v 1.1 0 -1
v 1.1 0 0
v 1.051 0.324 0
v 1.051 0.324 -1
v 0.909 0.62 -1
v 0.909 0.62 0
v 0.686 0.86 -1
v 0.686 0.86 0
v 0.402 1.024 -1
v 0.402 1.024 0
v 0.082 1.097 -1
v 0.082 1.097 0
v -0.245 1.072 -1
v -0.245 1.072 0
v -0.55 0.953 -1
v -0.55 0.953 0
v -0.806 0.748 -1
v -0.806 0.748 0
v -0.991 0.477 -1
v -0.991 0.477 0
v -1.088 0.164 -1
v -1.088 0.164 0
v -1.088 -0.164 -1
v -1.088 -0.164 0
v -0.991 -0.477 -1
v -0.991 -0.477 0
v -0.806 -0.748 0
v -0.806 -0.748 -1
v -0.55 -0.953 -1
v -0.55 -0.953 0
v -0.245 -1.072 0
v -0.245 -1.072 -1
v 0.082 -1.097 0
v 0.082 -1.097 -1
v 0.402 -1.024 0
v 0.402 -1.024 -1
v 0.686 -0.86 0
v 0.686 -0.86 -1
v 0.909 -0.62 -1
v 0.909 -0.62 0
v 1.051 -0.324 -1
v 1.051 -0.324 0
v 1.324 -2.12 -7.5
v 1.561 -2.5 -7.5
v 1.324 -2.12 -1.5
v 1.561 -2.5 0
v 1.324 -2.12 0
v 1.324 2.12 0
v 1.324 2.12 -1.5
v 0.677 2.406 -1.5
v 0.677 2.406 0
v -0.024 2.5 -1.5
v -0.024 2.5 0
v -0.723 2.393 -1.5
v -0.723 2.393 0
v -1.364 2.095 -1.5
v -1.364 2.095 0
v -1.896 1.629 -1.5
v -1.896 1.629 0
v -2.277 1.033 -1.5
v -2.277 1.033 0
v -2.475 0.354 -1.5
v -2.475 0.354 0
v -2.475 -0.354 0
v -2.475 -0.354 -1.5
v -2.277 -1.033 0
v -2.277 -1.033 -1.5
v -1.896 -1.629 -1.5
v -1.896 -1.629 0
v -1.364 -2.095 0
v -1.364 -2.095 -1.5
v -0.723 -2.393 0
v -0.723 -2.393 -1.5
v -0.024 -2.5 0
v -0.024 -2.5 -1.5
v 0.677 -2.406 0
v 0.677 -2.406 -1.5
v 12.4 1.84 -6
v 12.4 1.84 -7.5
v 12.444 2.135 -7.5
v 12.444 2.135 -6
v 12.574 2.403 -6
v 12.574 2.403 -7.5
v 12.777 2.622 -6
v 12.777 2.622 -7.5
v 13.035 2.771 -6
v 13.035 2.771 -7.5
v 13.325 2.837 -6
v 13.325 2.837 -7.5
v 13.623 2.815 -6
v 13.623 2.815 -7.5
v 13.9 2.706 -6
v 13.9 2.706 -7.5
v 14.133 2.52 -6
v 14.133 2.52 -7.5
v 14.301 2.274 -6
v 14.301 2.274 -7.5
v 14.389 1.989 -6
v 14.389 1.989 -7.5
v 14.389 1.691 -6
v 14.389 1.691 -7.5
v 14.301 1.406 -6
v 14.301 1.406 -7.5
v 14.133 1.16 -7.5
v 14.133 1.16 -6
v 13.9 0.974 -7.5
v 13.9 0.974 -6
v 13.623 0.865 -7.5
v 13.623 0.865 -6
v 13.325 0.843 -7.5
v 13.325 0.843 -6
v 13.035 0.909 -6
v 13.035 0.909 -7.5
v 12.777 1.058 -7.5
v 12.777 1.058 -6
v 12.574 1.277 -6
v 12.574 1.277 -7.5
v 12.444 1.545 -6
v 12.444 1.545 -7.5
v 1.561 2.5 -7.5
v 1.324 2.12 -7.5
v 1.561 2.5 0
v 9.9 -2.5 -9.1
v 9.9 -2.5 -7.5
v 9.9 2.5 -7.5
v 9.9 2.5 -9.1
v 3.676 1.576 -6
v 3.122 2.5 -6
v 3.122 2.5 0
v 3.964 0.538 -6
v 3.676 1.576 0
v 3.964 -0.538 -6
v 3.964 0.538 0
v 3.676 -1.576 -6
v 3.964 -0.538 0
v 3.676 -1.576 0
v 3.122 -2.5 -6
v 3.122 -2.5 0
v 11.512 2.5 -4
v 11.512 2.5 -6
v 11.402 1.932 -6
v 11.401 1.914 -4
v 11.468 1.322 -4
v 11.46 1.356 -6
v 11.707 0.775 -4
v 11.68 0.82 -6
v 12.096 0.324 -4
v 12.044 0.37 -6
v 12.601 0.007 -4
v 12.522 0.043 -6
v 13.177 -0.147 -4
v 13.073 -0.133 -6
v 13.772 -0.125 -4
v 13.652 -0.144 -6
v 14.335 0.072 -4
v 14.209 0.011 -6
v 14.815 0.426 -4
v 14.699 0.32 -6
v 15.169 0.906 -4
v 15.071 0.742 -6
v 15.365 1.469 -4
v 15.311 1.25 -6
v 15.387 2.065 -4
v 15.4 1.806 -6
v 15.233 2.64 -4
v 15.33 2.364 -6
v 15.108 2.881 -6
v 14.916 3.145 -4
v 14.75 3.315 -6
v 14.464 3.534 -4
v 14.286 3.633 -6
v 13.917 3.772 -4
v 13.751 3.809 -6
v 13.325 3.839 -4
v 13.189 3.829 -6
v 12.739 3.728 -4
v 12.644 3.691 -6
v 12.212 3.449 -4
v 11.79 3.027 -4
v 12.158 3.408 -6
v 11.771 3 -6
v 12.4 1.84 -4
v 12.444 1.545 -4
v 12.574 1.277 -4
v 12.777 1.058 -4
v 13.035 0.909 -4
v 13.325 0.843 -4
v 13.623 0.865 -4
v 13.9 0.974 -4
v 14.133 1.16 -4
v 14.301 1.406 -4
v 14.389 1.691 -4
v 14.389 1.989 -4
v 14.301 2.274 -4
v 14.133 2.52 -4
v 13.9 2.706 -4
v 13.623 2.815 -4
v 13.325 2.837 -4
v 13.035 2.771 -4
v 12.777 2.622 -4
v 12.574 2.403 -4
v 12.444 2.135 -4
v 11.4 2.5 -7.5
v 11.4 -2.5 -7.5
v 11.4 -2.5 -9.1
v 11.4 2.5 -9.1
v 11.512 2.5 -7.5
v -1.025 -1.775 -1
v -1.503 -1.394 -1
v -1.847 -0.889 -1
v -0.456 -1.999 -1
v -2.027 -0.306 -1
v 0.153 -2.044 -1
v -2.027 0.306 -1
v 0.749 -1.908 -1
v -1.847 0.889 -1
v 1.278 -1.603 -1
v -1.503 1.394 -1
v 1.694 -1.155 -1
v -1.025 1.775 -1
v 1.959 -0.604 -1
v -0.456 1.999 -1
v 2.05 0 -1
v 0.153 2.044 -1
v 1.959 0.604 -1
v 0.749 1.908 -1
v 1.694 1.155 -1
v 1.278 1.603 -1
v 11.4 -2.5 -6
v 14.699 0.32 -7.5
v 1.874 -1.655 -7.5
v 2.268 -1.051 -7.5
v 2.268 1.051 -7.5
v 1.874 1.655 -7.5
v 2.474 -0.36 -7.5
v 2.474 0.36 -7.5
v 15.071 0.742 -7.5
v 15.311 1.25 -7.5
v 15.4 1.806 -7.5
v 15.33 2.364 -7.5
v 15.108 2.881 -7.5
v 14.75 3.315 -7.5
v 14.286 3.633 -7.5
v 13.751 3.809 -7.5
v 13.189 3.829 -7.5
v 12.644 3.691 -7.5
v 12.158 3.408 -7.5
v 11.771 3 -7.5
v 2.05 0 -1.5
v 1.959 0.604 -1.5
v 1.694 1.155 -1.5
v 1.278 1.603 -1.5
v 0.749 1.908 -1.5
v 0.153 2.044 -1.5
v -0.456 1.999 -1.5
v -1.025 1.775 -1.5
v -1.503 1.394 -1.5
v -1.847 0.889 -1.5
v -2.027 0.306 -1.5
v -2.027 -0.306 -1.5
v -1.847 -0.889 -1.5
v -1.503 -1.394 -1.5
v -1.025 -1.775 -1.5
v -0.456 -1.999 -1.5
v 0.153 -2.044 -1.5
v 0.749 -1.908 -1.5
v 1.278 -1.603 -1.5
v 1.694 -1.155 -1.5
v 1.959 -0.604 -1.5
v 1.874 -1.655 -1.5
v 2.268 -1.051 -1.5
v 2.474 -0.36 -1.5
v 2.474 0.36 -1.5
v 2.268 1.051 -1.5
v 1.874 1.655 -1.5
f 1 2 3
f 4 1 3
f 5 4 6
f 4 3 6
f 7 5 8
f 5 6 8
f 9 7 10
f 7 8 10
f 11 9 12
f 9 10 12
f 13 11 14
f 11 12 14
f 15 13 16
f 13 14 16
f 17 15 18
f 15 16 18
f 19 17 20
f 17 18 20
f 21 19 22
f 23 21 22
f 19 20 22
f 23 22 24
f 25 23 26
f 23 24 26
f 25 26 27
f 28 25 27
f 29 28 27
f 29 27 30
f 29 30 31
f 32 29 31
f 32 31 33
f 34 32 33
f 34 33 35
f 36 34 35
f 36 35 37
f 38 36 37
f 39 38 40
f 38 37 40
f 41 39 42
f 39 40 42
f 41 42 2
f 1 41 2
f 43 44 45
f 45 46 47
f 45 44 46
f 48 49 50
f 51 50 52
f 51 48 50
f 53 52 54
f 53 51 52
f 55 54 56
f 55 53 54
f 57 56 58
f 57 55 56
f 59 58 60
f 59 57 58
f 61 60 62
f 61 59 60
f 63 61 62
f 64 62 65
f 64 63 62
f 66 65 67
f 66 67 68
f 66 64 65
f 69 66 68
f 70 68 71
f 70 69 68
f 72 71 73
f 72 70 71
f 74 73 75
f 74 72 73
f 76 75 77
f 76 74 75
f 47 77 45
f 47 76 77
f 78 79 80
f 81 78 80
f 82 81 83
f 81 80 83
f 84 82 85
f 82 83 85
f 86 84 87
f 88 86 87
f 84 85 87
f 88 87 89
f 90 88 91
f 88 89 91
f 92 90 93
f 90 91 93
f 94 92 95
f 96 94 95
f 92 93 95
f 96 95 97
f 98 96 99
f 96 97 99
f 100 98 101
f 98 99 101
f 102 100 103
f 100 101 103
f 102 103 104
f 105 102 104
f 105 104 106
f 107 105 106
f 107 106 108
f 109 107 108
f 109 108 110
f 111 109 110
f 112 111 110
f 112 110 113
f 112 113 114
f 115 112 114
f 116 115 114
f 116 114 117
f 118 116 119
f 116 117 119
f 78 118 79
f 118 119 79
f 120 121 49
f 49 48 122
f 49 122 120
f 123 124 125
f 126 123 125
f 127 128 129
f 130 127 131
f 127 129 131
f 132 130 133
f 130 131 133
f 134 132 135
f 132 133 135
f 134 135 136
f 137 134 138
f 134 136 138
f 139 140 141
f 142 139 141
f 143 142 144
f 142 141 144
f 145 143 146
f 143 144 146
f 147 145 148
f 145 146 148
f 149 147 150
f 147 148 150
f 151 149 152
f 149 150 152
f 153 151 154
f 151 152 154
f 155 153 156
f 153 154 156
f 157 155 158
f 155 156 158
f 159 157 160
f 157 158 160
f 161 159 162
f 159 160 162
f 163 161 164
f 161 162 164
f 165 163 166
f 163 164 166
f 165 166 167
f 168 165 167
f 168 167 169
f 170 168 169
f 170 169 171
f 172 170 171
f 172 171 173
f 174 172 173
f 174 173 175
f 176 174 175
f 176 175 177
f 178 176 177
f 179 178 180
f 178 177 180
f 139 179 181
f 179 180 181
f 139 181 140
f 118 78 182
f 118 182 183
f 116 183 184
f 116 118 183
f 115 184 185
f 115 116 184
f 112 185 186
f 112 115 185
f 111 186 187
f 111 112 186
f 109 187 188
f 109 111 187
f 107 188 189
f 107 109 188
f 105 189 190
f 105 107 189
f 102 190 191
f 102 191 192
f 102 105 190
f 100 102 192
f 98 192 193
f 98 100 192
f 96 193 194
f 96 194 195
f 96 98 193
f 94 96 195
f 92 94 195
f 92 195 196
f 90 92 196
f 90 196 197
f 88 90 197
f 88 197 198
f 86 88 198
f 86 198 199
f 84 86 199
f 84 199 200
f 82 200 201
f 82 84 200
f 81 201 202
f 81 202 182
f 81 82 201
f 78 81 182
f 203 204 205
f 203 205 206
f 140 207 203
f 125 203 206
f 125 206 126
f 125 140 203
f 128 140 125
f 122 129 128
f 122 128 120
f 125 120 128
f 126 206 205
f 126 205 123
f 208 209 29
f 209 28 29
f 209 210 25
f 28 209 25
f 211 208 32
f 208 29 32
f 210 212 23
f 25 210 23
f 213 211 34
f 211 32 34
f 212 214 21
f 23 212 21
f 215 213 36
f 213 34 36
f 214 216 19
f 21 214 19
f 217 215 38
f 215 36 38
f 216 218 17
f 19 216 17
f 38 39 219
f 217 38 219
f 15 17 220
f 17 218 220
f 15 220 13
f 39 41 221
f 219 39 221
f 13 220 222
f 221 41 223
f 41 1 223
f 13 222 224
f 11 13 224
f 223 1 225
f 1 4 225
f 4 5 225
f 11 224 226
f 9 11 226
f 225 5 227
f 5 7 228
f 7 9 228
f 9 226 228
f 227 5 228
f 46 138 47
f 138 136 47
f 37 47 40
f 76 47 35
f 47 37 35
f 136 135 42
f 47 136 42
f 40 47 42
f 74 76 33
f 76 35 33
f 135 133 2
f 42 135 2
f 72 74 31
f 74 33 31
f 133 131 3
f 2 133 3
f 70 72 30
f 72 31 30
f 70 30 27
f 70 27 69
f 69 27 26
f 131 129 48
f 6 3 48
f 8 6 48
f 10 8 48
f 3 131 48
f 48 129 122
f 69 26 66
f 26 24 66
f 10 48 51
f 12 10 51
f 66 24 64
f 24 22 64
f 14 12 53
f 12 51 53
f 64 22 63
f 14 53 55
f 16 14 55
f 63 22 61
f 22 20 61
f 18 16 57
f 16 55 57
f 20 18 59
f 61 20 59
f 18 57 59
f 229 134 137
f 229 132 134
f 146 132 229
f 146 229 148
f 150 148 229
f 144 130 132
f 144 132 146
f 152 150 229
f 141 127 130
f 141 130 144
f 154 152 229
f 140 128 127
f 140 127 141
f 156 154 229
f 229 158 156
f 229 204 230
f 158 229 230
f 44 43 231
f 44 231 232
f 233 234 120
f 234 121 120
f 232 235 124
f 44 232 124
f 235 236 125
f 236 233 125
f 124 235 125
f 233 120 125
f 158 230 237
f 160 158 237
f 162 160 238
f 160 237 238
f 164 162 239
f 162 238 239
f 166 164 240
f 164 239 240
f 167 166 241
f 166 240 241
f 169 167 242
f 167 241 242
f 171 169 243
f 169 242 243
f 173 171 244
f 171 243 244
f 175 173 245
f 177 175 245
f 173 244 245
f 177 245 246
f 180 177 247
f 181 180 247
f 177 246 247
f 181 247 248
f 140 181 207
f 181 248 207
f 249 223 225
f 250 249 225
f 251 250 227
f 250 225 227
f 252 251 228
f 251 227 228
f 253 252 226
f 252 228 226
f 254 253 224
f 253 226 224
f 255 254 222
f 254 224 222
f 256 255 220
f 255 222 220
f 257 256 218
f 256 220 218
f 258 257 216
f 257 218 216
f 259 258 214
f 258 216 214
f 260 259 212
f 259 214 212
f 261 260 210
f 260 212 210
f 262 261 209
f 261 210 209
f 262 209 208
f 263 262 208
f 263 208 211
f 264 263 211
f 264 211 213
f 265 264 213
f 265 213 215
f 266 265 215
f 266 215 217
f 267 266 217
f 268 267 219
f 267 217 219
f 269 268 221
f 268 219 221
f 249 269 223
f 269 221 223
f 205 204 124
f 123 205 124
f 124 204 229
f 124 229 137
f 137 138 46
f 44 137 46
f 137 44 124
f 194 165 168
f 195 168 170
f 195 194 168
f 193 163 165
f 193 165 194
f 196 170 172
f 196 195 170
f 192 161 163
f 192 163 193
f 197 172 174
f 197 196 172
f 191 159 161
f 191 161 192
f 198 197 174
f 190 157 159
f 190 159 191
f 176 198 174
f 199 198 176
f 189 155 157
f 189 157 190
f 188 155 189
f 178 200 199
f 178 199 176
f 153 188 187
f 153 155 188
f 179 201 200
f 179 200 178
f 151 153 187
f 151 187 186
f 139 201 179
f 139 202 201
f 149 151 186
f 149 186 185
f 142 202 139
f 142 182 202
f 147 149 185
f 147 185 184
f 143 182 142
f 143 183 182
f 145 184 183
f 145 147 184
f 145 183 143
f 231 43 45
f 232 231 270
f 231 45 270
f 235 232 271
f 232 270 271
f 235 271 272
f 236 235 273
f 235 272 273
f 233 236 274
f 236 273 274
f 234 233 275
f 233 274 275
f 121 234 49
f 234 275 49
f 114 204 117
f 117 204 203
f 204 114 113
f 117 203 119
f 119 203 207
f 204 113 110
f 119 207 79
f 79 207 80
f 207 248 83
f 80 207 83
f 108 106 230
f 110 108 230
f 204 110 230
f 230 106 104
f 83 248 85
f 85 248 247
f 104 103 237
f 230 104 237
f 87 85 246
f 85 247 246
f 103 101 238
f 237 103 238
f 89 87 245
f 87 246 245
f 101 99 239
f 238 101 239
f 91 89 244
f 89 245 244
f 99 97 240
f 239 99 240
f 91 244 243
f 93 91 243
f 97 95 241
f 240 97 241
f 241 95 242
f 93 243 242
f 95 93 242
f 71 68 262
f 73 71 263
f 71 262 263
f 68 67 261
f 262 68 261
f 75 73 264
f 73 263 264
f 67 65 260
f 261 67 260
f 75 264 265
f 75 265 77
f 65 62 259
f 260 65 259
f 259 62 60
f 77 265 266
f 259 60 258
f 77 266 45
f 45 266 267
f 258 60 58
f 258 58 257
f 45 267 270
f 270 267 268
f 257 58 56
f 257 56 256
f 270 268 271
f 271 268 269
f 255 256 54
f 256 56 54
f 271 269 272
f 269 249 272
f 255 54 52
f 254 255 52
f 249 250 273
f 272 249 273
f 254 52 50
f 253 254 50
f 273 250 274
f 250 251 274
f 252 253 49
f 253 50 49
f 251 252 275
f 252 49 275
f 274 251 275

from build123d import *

# Parameters (mm, degrees)
SKETCH1_R           = 2.5
SKETCH1_R_2         = 1.1
BOSS_EXTRUDE1_DEPTH = 1
SKETCH2_R           = 2.5
SKETCH2_R_2         = 2.05
BOSS_EXTRUDE2_DEPTH = 0.5
BOSS_EXTRUDE4_DEPTH = 7.5
SKETCH5_R           = 1
BOSS_EXTRUDE5_DEPTH = 1.5
SKETCH6_W           = 1.5
SKETCH6_H           = 5
BOSS_EXTRUDE6_DEPTH = 1.6
SKETCH7_R           = 2
SKETCH7_R_2         = 1
BOSS_EXTRUDE7_DEPTH = 2


with BuildPart() as part:
    # Sketch1 → Boss-Extrude1 (new body)
    with BuildSketch(Plane.XY):
        Circle(SKETCH1_R)
        Circle(SKETCH1_R_2, mode=Mode.SUBTRACT)
    extrude(amount=-BOSS_EXTRUDE1_DEPTH)

    # Sketch2 → Boss-Extrude2 (add)
    with BuildSketch(Plane.XY.offset(-1)):
        Circle(SKETCH2_R)
        Circle(SKETCH2_R_2, mode=Mode.SUBTRACT)
    extrude(amount=-BOSS_EXTRUDE2_DEPTH)

    # Sketch3 → Boss-Extrude4 (add)
    with BuildSketch(Plane.XY):
        with BuildLine():
            Line((3.122498999, -2.5), (1.5612495, -2.5))
            Line((1.5612495, -2.5), (1.324234542, -2.120472324))
            ThreePointArc((1.324234542, -2.120472324), (2.5, 0), (1.324234542, 2.120472324))
            Line((1.324234542, 2.120472324), (1.5612495, 2.5))
            Line((1.5612495, 2.5), (3.122498999, 2.5))
            ThreePointArc((3.122498999, 2.5), (4, 0), (3.122498999, -2.5))
        make_face()
    extrude(amount=-BOSS_EXTRUDE4_DEPTH)

    # Sketch5 → Boss-Extrude5 (add)
    with BuildSketch(Plane(origin=(0, 0, -7.5), x_dir=(-1, 0, 0), z_dir=(0, 0, -1))):
        with BuildLine():
            Line((-3.122498999, -2.5), (-11.4, -2.5))
            Line((-11.4, -2.5), (-14.699339628, 0.319566992))
            ThreePointArc((-14.699339628, 0.319566992), (-14.529243579, 3.49069953), (-11.512038136, 2.5))
            Line((-11.512038136, 2.5), (-3.122498999, 2.5))
            Line((-3.122498999, 2.5), (-3.122498999, -2.5))
        make_face()
        with Locations((-13.4, 1.84)):
            Circle(SKETCH5_R, mode=Mode.SUBTRACT)
    extrude(amount=-BOSS_EXTRUDE5_DEPTH)

    # Sketch6 → Boss-Extrude6 (add)
    with BuildSketch(Plane(origin=(0, 0, -7.5), x_dir=(-1, 0, 0), z_dir=(0, 0, -1))):
        with Locations((-10.65, 0)):
            Rectangle(SKETCH6_W, SKETCH6_H)
    extrude(amount=BOSS_EXTRUDE6_DEPTH)

    # Sketch7 → Boss-Extrude7 (add)
    with BuildSketch(Plane.XY.offset(-6)):
        with Locations(Location((13.4, 1.84, 0), (0, 0, 160.731224509))):
            Circle(SKETCH7_R)
        with Locations(Location((13.4, 1.84, 0), (0, 0, 180))):
            Circle(SKETCH7_R_2, mode=Mode.SUBTRACT)
    extrude(amount=BOSS_EXTRUDE7_DEPTH)


solid = part.part
